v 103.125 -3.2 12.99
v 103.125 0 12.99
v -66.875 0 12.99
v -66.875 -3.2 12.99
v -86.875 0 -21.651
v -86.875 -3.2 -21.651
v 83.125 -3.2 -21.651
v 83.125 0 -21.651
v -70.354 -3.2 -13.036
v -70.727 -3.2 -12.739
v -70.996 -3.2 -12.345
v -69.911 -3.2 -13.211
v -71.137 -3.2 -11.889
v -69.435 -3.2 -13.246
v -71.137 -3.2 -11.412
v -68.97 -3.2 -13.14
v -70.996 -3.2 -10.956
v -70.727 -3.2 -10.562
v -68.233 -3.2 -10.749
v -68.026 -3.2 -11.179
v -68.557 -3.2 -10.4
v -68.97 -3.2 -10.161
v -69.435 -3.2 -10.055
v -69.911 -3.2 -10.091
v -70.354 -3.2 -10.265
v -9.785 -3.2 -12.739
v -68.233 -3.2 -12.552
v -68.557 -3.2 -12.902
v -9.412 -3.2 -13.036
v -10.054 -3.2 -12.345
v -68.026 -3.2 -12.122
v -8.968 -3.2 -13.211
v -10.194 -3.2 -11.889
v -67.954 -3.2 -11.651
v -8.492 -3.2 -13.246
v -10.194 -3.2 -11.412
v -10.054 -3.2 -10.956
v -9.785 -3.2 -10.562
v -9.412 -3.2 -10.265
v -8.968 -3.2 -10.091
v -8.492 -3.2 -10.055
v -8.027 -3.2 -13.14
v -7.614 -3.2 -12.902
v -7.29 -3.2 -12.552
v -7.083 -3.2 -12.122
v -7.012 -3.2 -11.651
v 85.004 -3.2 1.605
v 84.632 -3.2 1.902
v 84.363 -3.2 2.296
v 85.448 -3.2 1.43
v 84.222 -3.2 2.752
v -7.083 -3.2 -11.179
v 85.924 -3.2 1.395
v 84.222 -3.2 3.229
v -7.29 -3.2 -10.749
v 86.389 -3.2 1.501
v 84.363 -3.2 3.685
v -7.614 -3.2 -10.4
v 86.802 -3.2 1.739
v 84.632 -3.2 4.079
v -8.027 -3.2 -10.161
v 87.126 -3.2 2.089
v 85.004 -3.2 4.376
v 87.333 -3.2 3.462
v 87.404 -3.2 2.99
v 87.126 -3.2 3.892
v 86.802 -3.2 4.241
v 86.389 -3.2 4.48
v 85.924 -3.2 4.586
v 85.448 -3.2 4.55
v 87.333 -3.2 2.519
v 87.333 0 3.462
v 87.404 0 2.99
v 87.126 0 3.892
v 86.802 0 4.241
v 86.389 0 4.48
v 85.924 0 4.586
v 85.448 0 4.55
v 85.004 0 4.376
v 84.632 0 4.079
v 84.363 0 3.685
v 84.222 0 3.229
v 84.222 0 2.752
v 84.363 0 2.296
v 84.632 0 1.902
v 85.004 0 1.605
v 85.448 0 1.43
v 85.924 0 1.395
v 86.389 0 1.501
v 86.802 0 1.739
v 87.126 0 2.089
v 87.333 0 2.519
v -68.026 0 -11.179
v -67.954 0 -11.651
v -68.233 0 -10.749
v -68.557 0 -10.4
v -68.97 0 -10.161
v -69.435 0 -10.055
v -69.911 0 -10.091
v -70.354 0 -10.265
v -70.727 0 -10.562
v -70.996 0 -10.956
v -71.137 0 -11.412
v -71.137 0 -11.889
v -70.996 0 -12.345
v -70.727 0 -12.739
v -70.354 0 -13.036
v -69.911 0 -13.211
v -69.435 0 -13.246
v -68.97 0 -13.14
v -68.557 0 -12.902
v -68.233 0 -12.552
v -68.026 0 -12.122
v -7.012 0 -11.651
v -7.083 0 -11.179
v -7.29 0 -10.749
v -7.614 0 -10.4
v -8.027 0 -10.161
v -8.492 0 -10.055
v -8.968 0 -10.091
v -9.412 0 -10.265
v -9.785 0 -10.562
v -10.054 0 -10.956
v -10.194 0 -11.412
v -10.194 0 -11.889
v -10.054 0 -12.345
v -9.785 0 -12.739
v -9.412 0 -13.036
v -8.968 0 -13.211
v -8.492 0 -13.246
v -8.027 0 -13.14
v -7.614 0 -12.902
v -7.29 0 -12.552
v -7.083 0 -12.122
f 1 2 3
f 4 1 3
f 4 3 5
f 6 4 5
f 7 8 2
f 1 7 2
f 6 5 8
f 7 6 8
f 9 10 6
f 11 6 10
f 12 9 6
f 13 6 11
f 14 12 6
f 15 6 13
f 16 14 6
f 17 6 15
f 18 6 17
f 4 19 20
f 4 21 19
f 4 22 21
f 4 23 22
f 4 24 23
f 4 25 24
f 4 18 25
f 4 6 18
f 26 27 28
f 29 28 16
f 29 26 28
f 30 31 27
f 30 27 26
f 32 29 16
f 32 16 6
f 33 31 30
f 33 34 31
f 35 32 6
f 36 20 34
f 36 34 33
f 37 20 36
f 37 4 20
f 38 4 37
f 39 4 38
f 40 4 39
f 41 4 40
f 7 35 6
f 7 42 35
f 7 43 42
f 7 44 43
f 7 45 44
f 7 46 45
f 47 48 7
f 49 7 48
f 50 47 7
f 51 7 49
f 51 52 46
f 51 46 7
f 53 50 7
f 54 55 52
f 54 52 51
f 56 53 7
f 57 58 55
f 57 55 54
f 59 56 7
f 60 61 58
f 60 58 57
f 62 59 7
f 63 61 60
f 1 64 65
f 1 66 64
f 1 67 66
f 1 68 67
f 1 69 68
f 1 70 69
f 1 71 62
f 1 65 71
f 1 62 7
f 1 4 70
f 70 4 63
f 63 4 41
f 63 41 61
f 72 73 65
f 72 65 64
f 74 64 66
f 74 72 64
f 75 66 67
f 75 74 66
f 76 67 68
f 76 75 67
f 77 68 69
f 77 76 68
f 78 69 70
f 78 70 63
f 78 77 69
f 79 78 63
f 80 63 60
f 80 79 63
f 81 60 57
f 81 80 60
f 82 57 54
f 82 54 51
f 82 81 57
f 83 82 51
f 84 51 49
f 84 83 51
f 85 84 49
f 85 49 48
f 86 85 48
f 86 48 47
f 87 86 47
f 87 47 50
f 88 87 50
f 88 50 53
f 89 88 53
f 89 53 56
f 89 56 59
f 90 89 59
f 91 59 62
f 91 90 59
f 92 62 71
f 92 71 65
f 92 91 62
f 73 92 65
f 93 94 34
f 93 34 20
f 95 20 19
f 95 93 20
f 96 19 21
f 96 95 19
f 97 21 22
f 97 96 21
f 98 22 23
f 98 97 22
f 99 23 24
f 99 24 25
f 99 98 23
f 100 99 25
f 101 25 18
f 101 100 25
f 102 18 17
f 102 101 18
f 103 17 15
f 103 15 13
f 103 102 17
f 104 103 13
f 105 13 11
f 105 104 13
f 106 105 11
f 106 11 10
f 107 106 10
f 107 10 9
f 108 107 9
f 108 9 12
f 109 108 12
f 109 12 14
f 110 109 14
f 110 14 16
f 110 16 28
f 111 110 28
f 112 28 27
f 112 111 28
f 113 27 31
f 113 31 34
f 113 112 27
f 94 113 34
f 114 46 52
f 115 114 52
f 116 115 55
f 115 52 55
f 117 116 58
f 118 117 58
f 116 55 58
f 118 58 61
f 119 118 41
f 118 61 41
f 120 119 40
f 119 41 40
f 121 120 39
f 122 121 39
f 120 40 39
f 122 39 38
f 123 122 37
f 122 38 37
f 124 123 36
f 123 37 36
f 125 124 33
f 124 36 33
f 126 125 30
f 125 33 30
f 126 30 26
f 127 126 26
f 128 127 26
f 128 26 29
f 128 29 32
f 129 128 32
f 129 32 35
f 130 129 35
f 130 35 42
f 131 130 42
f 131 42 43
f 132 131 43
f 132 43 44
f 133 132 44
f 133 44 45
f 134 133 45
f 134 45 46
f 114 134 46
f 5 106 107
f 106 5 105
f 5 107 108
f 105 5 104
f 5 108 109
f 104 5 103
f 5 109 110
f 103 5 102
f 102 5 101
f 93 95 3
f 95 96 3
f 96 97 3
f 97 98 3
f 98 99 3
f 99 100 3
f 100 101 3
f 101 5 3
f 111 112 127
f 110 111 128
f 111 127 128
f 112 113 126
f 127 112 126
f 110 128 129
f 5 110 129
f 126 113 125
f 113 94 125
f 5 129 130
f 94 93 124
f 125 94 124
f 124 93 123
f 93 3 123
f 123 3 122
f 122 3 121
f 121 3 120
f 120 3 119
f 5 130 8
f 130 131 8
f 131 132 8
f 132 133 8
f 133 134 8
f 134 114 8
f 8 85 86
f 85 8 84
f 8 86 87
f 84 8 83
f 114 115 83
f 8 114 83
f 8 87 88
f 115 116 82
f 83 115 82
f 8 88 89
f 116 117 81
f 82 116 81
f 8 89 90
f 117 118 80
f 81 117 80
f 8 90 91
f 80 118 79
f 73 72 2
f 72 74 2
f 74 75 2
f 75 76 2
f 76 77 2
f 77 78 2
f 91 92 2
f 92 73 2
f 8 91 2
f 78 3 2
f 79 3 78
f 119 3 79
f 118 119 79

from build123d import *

# Parameters (mm, degrees)
F0_R     = 1.6
F1_DEPTH = 3.2
F2_R     = 1.6
F3_DEPTH = 6


with BuildPart() as f1:
    # F0 (on Front) → F1 (new body)
    with BuildSketch(Plane.XZ):
        Polygon((83.125, -21.650635), (103.125, 12.990381), (-66.875, 12.990381), (-86.875, -21.650635), align=None)
        with Locations((-69.554492, -11.650635)):
            Circle(F0_R, mode=Mode.SUBTRACT)
        with Locations((85.804492, 2.990381)):
            Circle(F0_R, mode=Mode.SUBTRACT)
    extrude(amount=F1_DEPTH)

    # F2 (on face) → F3 (cut)
    with BuildSketch(Plane.XZ.offset(3.2)):
        with Locations((-8.611966, -11.650635)):
            Circle(F2_R)
    extrude(amount=-F3_DEPTH, mode=Mode.SUBTRACT)


solid = f1.part
